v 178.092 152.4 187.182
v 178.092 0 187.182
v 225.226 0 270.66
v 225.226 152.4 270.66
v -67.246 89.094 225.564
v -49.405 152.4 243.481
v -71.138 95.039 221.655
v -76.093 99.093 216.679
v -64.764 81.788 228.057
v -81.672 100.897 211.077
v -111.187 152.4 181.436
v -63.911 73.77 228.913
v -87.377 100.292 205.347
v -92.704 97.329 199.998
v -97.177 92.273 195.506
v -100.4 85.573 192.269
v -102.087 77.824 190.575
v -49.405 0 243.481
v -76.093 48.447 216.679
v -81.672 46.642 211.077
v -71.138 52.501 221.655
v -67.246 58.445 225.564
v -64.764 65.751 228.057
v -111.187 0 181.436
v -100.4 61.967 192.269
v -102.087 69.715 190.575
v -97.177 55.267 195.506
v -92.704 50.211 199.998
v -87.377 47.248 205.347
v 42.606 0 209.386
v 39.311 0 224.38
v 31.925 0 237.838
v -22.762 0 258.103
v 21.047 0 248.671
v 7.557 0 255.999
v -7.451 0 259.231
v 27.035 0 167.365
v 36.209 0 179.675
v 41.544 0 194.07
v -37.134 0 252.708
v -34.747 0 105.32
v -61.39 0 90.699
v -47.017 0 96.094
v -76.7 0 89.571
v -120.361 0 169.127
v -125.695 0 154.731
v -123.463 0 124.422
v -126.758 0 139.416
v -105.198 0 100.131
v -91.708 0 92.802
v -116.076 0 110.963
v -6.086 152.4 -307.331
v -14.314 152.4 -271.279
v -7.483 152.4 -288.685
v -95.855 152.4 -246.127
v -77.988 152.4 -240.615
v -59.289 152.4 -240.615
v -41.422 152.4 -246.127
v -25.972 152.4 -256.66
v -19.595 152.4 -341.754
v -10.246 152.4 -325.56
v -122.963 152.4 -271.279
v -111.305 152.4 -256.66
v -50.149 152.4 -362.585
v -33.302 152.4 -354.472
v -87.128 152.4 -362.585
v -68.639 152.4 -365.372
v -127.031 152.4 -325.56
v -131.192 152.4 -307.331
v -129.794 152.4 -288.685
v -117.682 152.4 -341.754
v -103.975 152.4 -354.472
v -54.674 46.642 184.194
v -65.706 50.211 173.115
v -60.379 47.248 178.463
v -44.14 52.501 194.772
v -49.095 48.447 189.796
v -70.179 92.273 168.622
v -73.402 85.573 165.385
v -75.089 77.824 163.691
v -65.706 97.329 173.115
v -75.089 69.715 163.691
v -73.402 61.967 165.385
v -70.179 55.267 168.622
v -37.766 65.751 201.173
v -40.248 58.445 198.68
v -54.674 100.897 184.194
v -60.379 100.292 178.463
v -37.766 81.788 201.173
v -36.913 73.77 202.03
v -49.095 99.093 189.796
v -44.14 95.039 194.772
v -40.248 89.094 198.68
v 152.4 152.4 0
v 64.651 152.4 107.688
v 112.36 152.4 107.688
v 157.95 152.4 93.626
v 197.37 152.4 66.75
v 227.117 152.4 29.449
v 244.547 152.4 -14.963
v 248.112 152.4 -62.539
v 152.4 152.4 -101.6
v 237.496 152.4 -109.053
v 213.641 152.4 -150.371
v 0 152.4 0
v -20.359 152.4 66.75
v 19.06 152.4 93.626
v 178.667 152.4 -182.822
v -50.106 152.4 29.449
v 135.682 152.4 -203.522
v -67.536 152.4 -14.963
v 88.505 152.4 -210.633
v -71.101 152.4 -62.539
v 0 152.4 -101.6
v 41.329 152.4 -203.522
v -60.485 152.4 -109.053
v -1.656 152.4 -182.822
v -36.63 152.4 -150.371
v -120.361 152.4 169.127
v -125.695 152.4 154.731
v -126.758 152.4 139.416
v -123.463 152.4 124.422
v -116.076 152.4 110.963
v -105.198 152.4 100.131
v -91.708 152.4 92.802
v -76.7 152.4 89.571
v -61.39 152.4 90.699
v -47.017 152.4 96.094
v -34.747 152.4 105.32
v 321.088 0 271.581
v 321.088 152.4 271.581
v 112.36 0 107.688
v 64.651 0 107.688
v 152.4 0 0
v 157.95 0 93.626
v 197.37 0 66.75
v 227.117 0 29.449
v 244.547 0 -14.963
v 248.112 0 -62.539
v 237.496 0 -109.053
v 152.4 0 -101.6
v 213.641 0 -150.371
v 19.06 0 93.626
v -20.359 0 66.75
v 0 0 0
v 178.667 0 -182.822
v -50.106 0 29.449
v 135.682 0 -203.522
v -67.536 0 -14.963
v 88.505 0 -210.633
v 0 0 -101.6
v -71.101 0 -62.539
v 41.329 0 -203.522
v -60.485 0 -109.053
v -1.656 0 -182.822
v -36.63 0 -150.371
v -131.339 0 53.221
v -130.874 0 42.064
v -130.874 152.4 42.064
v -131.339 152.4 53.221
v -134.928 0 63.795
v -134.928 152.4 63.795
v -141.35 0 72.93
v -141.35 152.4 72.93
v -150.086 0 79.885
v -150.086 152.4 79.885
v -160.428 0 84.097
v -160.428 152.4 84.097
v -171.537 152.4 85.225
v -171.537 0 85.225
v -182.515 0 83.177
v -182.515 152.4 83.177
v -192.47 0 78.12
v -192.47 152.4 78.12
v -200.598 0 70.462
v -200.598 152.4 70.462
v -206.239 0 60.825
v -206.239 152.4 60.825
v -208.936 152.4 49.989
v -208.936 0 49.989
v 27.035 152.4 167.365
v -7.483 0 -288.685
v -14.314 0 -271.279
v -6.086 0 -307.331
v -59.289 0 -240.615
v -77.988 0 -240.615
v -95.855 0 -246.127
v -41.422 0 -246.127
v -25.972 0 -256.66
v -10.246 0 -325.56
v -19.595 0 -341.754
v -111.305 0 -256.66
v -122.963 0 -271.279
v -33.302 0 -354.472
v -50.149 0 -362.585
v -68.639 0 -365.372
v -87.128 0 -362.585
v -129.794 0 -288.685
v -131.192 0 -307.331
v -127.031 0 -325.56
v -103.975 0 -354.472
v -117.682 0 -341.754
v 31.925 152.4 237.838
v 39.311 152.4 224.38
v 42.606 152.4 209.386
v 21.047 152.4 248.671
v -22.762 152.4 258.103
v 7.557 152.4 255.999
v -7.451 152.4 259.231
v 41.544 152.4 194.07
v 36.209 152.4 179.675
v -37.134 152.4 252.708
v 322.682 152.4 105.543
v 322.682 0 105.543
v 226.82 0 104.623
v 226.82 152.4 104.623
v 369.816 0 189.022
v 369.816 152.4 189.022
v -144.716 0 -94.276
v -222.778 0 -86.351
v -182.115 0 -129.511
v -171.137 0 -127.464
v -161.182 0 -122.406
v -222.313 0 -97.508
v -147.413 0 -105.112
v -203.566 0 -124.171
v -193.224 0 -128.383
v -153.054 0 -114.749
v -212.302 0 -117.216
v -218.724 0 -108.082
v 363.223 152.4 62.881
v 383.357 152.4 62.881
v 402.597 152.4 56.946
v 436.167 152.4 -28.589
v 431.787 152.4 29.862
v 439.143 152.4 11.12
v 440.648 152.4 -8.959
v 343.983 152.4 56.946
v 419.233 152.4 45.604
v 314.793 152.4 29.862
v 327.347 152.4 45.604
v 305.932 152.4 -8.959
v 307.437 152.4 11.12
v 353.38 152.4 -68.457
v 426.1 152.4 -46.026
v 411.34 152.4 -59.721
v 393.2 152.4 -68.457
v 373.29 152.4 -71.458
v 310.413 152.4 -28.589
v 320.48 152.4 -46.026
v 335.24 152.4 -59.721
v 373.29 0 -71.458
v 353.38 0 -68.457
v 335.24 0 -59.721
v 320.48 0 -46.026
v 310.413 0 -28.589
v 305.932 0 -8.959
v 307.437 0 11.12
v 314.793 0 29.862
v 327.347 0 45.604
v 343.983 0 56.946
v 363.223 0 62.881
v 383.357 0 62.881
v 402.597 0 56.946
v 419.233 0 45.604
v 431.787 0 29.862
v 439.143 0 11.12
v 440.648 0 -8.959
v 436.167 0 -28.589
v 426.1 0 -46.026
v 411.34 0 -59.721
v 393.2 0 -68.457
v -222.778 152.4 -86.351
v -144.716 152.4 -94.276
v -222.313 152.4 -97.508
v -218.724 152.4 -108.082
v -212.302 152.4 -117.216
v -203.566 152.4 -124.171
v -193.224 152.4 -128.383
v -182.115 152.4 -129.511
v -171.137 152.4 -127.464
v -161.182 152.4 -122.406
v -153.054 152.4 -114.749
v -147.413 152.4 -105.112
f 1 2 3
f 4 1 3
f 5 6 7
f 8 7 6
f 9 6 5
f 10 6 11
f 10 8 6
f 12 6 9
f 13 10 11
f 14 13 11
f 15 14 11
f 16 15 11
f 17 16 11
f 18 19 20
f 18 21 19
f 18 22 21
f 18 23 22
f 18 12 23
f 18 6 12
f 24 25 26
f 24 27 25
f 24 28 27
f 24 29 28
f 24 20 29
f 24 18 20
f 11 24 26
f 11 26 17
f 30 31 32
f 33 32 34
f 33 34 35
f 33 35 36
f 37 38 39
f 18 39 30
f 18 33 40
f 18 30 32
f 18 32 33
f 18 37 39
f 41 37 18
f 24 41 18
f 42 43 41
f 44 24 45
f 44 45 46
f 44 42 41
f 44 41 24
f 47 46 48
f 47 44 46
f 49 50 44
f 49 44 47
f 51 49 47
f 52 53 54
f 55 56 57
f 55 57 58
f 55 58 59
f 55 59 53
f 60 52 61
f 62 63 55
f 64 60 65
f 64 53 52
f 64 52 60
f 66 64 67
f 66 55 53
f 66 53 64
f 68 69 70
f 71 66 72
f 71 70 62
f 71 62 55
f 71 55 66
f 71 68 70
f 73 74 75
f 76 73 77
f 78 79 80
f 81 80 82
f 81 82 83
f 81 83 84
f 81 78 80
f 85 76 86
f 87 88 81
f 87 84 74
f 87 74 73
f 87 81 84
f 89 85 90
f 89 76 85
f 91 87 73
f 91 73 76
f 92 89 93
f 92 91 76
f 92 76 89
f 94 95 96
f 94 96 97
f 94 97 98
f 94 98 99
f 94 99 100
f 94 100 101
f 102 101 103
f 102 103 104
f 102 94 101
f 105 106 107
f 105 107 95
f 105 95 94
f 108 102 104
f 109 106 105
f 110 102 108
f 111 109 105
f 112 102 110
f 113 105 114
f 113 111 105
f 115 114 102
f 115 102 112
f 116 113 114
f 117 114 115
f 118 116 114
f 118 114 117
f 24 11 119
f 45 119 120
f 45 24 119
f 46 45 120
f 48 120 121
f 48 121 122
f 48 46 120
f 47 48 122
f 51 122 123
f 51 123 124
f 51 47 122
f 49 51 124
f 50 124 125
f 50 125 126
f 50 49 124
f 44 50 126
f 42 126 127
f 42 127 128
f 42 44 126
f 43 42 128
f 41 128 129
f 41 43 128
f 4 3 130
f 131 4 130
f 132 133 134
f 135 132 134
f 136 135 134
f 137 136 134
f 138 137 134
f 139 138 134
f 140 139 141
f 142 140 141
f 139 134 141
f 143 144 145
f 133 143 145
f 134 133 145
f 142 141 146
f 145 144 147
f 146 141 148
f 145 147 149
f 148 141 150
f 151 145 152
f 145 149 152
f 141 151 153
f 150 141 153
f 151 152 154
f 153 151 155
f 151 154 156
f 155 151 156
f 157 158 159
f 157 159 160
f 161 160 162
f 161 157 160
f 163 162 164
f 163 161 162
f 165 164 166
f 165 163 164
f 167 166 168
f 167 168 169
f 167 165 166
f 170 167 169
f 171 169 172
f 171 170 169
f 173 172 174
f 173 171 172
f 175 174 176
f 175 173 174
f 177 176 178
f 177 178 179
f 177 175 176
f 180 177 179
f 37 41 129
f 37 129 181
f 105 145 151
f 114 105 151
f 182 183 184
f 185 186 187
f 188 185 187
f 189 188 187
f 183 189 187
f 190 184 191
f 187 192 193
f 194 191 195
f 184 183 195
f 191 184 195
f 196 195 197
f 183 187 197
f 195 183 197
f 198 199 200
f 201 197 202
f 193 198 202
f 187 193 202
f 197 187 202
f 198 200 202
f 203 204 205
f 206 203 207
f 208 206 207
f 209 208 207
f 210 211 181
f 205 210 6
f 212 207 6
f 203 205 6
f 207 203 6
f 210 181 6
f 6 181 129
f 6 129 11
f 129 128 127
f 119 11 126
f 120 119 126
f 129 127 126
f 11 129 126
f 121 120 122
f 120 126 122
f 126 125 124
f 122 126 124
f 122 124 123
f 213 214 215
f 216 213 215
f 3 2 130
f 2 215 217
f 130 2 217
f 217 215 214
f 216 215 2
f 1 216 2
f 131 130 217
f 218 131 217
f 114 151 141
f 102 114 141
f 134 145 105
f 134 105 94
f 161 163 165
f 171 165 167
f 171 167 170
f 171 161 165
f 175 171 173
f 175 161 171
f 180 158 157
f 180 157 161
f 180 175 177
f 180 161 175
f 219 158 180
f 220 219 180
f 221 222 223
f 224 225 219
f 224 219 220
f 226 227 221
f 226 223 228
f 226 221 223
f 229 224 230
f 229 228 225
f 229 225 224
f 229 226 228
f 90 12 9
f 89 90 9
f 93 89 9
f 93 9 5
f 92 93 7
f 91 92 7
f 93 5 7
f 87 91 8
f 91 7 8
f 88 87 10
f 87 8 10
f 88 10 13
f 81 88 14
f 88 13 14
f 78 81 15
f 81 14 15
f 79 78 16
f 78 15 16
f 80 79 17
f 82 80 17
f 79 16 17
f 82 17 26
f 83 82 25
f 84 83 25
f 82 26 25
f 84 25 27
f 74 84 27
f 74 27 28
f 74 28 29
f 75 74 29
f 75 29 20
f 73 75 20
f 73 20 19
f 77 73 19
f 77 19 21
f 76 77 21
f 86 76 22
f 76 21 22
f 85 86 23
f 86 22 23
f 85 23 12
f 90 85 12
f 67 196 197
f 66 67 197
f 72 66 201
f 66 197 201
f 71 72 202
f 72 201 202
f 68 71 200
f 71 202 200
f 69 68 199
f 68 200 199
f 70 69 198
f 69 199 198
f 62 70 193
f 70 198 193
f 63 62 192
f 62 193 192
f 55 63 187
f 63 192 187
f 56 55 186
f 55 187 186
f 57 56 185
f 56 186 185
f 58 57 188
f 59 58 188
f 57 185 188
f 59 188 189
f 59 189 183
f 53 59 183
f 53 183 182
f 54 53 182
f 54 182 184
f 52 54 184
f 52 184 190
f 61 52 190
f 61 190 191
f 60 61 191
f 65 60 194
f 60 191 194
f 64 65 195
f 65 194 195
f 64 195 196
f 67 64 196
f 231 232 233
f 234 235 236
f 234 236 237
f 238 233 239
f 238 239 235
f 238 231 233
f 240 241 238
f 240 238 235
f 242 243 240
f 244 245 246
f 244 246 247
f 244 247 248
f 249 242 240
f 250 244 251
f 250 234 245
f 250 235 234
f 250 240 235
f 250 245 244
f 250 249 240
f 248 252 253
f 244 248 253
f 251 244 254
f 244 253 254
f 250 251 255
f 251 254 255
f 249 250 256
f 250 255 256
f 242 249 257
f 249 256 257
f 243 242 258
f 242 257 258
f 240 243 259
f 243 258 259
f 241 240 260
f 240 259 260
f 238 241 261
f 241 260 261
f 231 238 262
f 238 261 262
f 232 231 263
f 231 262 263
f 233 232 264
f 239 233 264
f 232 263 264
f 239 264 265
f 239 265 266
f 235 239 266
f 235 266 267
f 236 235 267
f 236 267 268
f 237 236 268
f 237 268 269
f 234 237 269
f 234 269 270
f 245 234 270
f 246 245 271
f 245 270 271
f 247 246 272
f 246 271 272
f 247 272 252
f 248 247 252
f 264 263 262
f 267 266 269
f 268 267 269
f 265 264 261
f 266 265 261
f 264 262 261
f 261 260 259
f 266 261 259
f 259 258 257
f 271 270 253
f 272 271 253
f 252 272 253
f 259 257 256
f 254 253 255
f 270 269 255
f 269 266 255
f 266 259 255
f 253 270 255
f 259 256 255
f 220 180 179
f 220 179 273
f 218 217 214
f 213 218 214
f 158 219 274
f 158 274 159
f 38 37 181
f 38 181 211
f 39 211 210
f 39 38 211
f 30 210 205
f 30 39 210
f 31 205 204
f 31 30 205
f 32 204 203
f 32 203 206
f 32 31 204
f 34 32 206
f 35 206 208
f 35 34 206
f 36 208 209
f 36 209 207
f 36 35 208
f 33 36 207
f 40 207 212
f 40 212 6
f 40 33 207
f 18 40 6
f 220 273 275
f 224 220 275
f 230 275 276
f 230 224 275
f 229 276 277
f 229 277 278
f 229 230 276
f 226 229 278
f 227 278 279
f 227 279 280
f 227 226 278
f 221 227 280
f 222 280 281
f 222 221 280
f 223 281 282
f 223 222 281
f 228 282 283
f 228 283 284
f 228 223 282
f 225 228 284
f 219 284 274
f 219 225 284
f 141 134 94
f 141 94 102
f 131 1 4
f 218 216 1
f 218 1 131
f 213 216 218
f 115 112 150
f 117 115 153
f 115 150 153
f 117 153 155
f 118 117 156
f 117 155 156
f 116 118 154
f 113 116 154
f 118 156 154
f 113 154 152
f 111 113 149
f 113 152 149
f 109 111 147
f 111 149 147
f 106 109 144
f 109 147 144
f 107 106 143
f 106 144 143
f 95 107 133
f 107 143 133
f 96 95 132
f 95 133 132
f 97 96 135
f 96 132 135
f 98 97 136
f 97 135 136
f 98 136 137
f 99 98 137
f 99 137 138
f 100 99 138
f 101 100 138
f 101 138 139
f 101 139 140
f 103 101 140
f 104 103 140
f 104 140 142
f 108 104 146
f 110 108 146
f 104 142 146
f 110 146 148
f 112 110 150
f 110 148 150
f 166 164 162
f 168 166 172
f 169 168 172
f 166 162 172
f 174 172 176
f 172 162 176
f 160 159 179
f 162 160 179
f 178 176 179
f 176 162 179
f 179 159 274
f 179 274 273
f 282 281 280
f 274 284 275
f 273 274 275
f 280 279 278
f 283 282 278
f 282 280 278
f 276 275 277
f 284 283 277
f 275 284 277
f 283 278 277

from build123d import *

# Parameters (mm, degrees)
SKETCH1_R             = 160.054383024
SKETCH1_W             = 152.4
SKETCH1_H             = 101.6
BOSS_EXTRUDE1_DEPTH   = 152.4
SKETCH1_R_2           = 67.546599545
BOSS_EXTRUDE1_2_DEPTH = 152.4
SKETCH1_R_3           = 62.72842728
BOSS_EXTRUDE1_3_DEPTH = 152.4
BOSS_EXTRUDE1_4_DEPTH = 152.4
BOSS_EXTRUDE1_5_DEPTH = 152.4
BOSS_EXTRUDE1_6_DEPTH = 152.4
SKETCH2_R             = 27.203777015
CUT_EXTRUDE1_DEPTH    = 38.1


with BuildPart() as part:
    # Sketch1 → Boss-Extrude1 (new body)
    with BuildSketch(Plane(origin=(0, 0, 0), x_dir=(1, 0, 0), z_dir=(0, 1, 0))):
        with Locations(Location((88.50543124, 50.578437179, 0), (0, 0, 90))):
            Circle(SKETCH1_R)
        with Locations((76.2, 50.8)):
            Rectangle(SKETCH1_W, SKETCH1_H, mode=Mode.SUBTRACT)
    extrude(amount=BOSS_EXTRUDE1_DEPTH)


with BuildPart() as body_2:
    # Sketch1 → Boss-Extrude1 2 (new body)
    with BuildSketch(Plane(origin=(0, 0, 0), x_dir=(1, 0, 0), z_dir=(0, 1, 0))):
        with Locations(Location((373.289947205, 3.911024814, 0), (0, 0, 90))):
            Circle(SKETCH1_R_2)
    extrude(amount=BOSS_EXTRUDE1_2_DEPTH)


with BuildPart() as body_3:
    # Sketch1 → Boss-Extrude1 3 (new body)
    with BuildSketch(Plane(origin=(0, 0, 0), x_dir=(1, 0, 0), z_dir=(0, 1, 0))):
        with Locations(Location((-68.638535942, 302.643214026, 0), (0, 0, 90))):
            Circle(SKETCH1_R_3)
    extrude(amount=BOSS_EXTRUDE1_3_DEPTH)


with BuildPart() as body_4:
    # Sketch1 → Boss-Extrude1 4 (new body)
    with BuildSketch(Plane(origin=(0, 0, 0), x_dir=(1, 0, 0), z_dir=(0, 1, 0))):
        Polygon((225.22648648, -270.660475239), (321.088205207, -271.580508421), (369.815836678, -189.021841345), (322.681749423, -105.543141086), (226.820030696, -104.623107904), (178.092399225, -187.18177498), align=None)
    extrude(amount=BOSS_EXTRUDE1_4_DEPTH)


with BuildPart() as body_5:
    # Sketch1 → Boss-Extrude1 5 (new body)
    with BuildSketch(Plane(origin=(0, 0, 0), x_dir=(1, 0, 0), z_dir=(0, 1, 0))):
        with BuildLine():
            Line((-144.715826236, 94.276120946), (-130.873948783, -42.06424919))
            ThreePointArc((-130.873948783, -42.06424919), (-165.942443278, -85.057964519), (-208.936158607, -49.989470025))
            Line((-208.936158607, -49.989470025), (-222.77803606, 86.350900111))
            ThreePointArc((-222.77803606, 86.350900111), (-187.709541566, 129.344615441), (-144.715826236, 94.276120946))
        make_face()
    extrude(amount=BOSS_EXTRUDE1_5_DEPTH)


with BuildPart() as body_6:
    # Sketch1 → Boss-Extrude1 6 (new body)
    with BuildSketch(Plane(origin=(0, 0, 0), x_dir=(1, 0, 0), z_dir=(0, 1, 0))):
        with BuildLine():
            Line((-49.404670277, -243.481375716), (-111.18669851, -181.436163559))
            ThreePointArc((-111.18669851, -181.436163559), (-111.024576314, -105.15816066), (-34.746573415, -105.320282856))
            Line((-34.746573415, -105.320282856), (27.035454818, -167.365495014))
            ThreePointArc((27.035454818, -167.365495014), (26.873332621, -243.643497912), (-49.404670277, -243.481375716))
        make_face()
    extrude(amount=BOSS_EXTRUDE1_6_DEPTH)

    # Sketch2 → Cut-Extrude1 (cut, symmetric)
    with BuildSketch(Plane(origin=(-146.546927918, 0, 145.925303875), x_dir=(0.7056022940885255, 0, 0.7086080740275332), z_dir=(-0.7086080740275332, 0, 0.7056022940885255))):
        with Locations((89.910225123, 73.76978969)):
            Circle(SKETCH2_R)
    extrude(amount=CUT_EXTRUDE1_DEPTH, both=True, mode=Mode.SUBTRACT)


solid = Compound([part.part, body_2.part, body_3.part, body_4.part, body_5.part, body_6.part])
